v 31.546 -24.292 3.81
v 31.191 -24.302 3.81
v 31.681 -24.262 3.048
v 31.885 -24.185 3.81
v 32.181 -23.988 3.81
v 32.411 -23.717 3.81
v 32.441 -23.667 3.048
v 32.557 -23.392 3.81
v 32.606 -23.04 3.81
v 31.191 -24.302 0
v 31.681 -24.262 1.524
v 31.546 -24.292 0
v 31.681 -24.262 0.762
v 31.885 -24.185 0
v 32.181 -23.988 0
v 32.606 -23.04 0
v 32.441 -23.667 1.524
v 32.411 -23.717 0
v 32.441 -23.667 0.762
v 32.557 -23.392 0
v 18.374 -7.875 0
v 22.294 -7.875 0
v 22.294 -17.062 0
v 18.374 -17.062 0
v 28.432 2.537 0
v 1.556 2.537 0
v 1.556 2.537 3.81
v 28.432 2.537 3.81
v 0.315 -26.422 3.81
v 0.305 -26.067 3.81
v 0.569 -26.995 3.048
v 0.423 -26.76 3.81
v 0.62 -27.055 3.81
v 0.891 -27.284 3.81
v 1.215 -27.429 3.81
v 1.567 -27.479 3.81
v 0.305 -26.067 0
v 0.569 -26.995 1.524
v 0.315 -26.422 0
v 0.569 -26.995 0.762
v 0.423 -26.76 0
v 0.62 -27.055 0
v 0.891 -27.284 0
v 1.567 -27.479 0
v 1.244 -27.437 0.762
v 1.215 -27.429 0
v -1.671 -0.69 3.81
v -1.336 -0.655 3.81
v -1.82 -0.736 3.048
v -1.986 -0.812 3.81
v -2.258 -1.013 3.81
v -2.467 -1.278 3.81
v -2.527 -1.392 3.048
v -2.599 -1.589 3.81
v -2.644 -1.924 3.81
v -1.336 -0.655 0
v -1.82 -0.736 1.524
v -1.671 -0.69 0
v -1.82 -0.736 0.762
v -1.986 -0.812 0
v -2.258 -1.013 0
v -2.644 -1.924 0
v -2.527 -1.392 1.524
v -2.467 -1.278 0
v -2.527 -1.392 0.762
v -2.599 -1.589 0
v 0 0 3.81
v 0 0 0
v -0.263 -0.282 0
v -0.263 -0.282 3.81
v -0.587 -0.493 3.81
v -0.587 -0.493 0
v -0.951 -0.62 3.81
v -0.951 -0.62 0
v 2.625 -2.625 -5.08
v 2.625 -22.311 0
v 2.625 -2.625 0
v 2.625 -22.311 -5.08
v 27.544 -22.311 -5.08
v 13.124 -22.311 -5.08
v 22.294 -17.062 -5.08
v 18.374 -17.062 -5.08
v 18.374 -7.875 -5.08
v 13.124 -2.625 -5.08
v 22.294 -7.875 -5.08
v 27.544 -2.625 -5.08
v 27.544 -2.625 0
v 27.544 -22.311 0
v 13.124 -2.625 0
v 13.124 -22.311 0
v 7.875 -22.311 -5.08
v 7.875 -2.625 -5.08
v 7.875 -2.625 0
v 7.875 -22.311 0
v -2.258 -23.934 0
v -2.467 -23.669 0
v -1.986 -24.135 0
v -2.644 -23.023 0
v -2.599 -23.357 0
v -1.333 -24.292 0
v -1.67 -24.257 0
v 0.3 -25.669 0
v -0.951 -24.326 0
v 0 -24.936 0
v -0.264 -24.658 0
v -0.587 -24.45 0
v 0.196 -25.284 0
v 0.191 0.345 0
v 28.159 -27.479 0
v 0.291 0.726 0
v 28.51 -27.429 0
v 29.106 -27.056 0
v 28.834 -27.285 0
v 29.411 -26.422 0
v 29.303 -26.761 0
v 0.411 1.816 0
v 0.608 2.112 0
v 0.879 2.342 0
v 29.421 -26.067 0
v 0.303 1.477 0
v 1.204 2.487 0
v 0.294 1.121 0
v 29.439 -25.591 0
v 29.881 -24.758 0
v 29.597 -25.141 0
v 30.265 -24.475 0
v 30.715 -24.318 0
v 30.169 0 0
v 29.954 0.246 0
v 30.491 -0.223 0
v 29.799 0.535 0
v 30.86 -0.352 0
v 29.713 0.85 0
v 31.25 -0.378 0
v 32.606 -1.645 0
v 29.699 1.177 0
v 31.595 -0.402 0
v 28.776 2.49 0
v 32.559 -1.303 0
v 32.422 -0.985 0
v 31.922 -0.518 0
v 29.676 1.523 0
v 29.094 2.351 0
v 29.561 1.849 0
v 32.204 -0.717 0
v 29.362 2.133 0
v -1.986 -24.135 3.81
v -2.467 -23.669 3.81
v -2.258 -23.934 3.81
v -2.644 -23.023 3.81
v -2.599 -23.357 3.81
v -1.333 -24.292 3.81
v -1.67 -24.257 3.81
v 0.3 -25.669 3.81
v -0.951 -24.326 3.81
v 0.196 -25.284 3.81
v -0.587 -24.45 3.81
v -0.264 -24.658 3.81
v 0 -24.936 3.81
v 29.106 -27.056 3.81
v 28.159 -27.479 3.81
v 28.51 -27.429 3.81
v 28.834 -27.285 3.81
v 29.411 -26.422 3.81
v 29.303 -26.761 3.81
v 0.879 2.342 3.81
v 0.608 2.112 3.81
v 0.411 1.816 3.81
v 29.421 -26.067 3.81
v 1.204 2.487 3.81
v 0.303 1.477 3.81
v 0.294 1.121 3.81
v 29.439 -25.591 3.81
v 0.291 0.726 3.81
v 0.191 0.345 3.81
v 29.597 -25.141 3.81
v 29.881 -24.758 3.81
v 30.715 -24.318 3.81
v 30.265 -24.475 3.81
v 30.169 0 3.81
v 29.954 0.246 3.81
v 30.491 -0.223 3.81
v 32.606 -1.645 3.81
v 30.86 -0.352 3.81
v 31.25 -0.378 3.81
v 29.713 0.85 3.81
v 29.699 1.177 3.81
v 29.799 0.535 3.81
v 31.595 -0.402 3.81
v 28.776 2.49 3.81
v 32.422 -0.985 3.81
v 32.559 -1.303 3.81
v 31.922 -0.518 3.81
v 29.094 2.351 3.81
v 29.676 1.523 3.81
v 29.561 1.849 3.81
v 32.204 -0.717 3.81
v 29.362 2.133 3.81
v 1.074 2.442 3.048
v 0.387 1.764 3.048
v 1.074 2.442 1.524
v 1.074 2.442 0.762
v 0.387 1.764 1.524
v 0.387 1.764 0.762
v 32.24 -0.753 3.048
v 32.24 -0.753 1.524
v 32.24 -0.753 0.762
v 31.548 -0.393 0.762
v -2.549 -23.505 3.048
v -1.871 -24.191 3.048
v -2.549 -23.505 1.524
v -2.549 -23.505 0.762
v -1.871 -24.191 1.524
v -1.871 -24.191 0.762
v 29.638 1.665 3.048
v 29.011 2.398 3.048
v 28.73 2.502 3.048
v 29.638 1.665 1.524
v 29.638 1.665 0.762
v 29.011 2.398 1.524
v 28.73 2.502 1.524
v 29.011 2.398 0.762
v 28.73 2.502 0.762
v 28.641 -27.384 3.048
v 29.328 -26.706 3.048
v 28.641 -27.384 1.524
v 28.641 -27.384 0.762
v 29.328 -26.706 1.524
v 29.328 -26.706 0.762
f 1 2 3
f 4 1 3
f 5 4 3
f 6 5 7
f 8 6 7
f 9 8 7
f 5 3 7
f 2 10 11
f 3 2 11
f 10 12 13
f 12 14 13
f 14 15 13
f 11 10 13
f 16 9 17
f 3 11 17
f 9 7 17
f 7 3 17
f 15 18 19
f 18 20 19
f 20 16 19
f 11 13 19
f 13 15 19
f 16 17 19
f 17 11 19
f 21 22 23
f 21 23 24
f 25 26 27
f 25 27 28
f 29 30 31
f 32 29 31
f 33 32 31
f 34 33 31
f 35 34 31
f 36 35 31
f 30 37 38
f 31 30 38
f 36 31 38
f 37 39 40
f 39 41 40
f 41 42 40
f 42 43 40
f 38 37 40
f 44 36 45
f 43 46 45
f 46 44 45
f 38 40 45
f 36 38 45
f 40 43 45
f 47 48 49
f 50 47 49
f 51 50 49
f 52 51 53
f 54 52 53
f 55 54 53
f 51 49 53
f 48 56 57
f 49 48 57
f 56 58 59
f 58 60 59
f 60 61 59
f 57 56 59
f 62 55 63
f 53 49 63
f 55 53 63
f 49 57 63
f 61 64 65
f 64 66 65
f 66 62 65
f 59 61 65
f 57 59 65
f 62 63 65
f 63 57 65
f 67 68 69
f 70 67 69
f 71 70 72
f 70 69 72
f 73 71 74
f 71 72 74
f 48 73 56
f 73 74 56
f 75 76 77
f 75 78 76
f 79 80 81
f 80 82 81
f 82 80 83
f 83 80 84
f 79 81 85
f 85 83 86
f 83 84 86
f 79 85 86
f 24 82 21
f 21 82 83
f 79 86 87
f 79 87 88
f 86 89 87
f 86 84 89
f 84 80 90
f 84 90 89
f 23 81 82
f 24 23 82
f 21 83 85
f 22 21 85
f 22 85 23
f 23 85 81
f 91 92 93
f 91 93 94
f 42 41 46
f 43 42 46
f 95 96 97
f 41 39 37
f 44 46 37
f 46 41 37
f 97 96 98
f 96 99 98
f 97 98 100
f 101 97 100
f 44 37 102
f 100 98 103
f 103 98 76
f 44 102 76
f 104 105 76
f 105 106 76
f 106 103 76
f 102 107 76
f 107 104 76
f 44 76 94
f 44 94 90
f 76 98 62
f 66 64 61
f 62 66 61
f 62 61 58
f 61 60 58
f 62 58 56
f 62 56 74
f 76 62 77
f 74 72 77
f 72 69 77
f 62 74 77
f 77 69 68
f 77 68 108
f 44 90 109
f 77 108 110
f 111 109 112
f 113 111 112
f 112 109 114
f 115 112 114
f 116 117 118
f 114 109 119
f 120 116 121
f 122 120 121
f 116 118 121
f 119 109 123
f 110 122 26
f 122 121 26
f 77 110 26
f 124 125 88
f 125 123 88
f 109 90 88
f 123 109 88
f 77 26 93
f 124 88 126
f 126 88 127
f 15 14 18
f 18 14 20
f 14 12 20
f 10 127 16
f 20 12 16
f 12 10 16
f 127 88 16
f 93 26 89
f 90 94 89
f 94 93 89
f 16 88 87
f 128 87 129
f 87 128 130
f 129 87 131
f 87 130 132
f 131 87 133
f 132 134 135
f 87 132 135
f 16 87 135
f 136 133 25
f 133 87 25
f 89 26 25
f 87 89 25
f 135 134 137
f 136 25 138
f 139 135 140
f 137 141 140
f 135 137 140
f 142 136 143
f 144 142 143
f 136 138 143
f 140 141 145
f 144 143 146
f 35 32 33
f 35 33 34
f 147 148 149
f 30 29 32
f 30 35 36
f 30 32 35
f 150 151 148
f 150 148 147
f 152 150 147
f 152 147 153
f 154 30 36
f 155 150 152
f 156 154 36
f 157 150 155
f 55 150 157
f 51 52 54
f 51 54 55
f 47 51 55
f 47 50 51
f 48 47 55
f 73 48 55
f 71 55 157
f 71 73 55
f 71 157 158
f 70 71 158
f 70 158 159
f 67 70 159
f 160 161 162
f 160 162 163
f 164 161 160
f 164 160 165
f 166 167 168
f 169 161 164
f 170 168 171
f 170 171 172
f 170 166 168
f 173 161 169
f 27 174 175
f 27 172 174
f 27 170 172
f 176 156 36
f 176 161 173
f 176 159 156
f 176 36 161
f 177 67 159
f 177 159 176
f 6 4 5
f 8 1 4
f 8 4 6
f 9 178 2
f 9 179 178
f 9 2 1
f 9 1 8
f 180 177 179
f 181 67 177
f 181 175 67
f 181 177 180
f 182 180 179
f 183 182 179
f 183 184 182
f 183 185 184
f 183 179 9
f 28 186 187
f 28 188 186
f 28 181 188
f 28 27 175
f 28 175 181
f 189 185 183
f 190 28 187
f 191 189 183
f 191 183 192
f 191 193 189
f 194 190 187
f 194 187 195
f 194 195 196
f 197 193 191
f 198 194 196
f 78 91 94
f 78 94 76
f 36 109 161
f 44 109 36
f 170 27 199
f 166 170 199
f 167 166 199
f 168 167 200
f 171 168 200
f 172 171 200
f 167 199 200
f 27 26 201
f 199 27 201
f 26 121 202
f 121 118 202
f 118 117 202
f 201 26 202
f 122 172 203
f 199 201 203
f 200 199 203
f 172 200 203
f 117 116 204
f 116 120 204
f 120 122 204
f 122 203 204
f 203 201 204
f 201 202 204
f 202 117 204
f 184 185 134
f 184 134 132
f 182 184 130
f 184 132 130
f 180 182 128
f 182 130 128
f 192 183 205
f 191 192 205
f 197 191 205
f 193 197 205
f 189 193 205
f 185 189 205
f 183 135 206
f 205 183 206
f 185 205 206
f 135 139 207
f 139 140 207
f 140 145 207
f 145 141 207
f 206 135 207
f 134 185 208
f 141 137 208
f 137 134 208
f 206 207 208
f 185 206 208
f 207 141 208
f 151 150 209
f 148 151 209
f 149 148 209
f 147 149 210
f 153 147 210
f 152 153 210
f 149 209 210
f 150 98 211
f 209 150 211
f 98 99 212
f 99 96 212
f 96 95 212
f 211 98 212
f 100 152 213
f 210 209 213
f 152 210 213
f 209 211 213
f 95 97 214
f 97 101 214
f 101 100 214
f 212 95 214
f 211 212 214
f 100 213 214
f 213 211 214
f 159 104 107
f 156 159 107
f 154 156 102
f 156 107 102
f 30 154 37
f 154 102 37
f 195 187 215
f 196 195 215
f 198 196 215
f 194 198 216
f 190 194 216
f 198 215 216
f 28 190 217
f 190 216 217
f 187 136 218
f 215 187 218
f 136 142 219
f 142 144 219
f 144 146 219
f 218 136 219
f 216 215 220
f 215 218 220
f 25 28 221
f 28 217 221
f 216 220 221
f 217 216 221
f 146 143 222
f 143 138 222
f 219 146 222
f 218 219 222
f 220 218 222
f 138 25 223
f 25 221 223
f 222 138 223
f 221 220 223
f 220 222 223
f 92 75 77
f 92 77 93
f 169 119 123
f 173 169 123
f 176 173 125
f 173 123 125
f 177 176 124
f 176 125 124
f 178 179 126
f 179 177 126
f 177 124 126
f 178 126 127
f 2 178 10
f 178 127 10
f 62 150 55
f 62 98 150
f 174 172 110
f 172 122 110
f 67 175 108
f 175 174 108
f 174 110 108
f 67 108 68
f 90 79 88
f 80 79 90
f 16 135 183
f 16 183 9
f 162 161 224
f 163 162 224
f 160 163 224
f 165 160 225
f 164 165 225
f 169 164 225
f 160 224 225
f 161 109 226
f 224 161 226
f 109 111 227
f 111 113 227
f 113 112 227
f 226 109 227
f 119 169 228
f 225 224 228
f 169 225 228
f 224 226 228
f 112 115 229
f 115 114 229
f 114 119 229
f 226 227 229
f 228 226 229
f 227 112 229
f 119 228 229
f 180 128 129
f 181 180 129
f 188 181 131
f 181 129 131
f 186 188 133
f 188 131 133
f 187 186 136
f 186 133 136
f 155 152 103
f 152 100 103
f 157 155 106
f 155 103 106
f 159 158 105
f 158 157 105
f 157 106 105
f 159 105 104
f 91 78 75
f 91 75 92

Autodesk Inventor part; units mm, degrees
ref_plane "YZ Plane" through (0, 0, 0) normal (1, 0, 0) x (0, 1, 0)
ref_plane "XZ Plane" through (0, 0, 0) normal (0, 1, 0) x (-1, 0, 0)
ref_plane "XY Plane" through (0, 0, 0) normal (0, 0, 1) x (1, 0, 0)
sketch "Base" plane through (0, 0, 0) normal (0, 0, 1) x (1, 0, 0)
  spline S0 degree 3 poles (29.6992, 1.1773) (29.7109, 1.3423) (29.6903, 1.508) (29.5867, 1.8221) (29.5048, 1.9675) (29.2897, 2.2188) (29.1586, 2.3222) (28.9221, 2.4433) (28.8277, 2.4783) (28.6327, 2.5254) (28.5327, 2.5373) (28.4324, 2.5373) knots 0 0 0 0 0.049612 0.049612 0.099224 0.099224 0.148836 0.148836 0.178932 0.178932 0.209028 0.209028 0.209028 0.209028
  line L0 (1.5557, 2.5369) -> (28.4324, 2.5373)
  spline S1 degree 3 poles (1.5557, 2.5369) (1.3904, 2.5369) (1.2266, 2.5046) (0.9206, 2.379) (0.7813, 2.287) (0.5459, 2.0546) (0.452, 1.9166) (0.3443, 1.6634) (0.3145, 1.5572) (0.2831, 1.3399) (0.2816, 1.2297) (0.2942, 1.1206) knots 0 0 0 0 0.049612 0.049612 0.099224 0.099224 0.148836 0.148836 0.181775 0.181775 0.214715 0.214715 0.214715 0.214715
  arc A0 (0, 0) -> (0.2942, 1.1206) centre (-1.2879, 0.9371) ccw
  line L1 (30.1691, 0) -> (0, 0)
  arc A1 (29.6992, 1.1773) -> (30.1691, 0) centre (31.151, 1.0743) ccw
  spline S2 degree 3 poles (-2.6437, -23.0226) (-2.6437, -23.1879) (-2.6114, -23.3517) (-2.4858, -23.6576) (-2.3938, -23.7968) (-2.1615, -24.0323) (-2.0234, -24.1261) (-1.7866, -24.227) (-1.6982, -24.2538) (-1.5172, -24.2877) (-1.4252, -24.2948) (-1.3332, -24.2919) knots 0 0 0 0 0.049602 0.049602 0.099207 0.099207 0.148822 0.148822 0.176438 0.176438 0.204053 0.204053 0.204053 0.204053
  arc A2 (0, -24.9362) -> (-1.3332, -24.2919) centre (-1.2826, -25.8888) ccw
  line L2 (0, 0) -> (0, -24.9362)
  arc A3 (-1.3355, -0.6549) -> (0, 0) centre (-1.2879, 0.9371) ccw
  spline S3 degree 3 poles (-1.3355, -0.6549) (-1.5008, -0.65) (-1.6656, -0.6774) (-1.9753, -0.7938) (-2.1173, -0.8817) (-2.3596, -1.107) (-2.4576, -1.2422) (-2.5652, -1.4755) (-2.5945, -1.5626) (-2.6338, -1.7415) (-2.6437, -1.8328) (-2.6437, -1.9244) knots 0 0 0 0 0.049634 0.049634 0.099263 0.099263 0.148881 0.148881 0.176354 0.176354 0.203827 0.203827 0.203827 0.203827
  line L3 (-2.6437, -23.0226) -> (-2.6437, -1.9244)
  spline S4 degree 3 poles (28.1591, -27.4789) (28.3245, -27.4789) (28.4883, -27.4466) (28.7943, -27.3211) (28.9335, -27.229) (29.1689, -26.9966) (29.2628, -26.8586) (29.3703, -26.6061) (29.3999, -26.5007) (29.4315, -26.285) (29.4334, -26.1755) (29.4212, -26.0671) knots 0 0 0 0 0.049612 0.049612 0.099224 0.099224 0.148836 0.148836 0.181546 0.181546 0.214256 0.214256 0.214256 0.214256
  arc A4 (31.1912, -24.3016) -> (29.4212, -26.0671) centre (31.0088, -25.8888) ccw
  spline S5 degree 3 poles (31.1912, -24.3016) (31.3556, -24.3204) (31.5221, -24.307) (31.8405, -24.2172) (31.9894, -24.1416) (32.2499, -23.9376) (32.3589, -23.8111) (32.4948, -23.5721) (32.5363, -23.4703) (32.5923, -23.2585) (32.6065, -23.1495) (32.6065, -23.0399) knots 0 0 0 0 0.049634 0.049634 0.099263 0.099263 0.148881 0.148881 0.18174 0.18174 0.214599 0.214599 0.214599 0.214599
  line L4 (32.6065, -1.6448) -> (32.6065, -23.0399)
  spline S6 degree 3 poles (32.6065, -1.6448) (32.6065, -1.4795) (32.5742, -1.3157) (32.4486, -1.0098) (32.3566, -0.8705) (32.1243, -0.6351) (31.9862, -0.5412) (31.7423, -0.4373) (31.6462, -0.4092) (31.4495, -0.376) (31.3495, -0.371) (31.2499, -0.3778) knots 0 0 0 0 0.049602 0.049602 0.099206 0.099206 0.14882 0.14882 0.178752 0.178752 0.208681 0.208681 0.208681 0.208681
  arc A5 (30.1691, 0) -> (31.2499, -0.3778) centre (31.151, 1.0743) ccw
  line L5 (30.1691, -22.3113) -> (30.1691, 0)
  line L6 (27.5442, -22.3113) -> (30.1691, -22.3113)
  line L7 (27.5442, -24.9362) -> (27.5442, -22.3113)
  line L8 (0, -24.9362) -> (27.5442, -24.9362)
  arc A6 (0.305, -26.0673) -> (0, -24.9362) centre (-1.2826, -25.8888) ccw
  spline S7 degree 3 poles (0.305, -26.0673) (0.2866, -26.2317) (0.3003, -26.398) (0.3909, -26.7161) (0.4669, -26.8648) (0.6714, -27.1247) (0.7981, -27.2334) (1.037, -27.3685) (1.1385, -27.4097) (1.3494, -27.4652) (1.458, -27.4793) (1.5671, -27.4793) knots 0 0 0 0 0.049612 0.049612 0.099224 0.099224 0.148836 0.148836 0.181555 0.181555 0.214273 0.214273 0.214273 0.214273
  line L9 (28.1591, -27.4789) -> (1.5671, -27.4793)
  point P0 (30.1691, 0)
  point P1 (30.1691, 0)
extrude "BaseFeature" add sketch "Base" along normal blind 3.81
extrude "LogoFeature" add sketch "Base" against normal blind 5.08 contours L5 L6 L7 L8 L2 L1
sketch "LogoDetail" plane through (0, 0, -5.08) normal (0, 0, -1) x (-1, 0, 0)
  line L0 (-18.374, -7.8746) -> (-22.2945, -7.8746)
  line L1 (-27.5442, -22.3113) -> (-13.1243, -22.3113)
  line L2 (-22.2945, -17.0616) -> (-18.374, -17.0616)
  line L3 (-13.1243, -2.6249) -> (-27.5442, -2.6249)
  line L4 (-22.2945, -7.8746) -> (-22.2945, -17.0616)
  line L5 (-18.374, -17.0616) -> (-18.374, -7.8746)
  line L6 (-30.1691, -22.3113) -> (-30.1691, 0)
  line L7 (-27.5442, -2.6249) -> (-27.5442, -22.3113)
  line L8 (-13.1243, -22.3113) -> (-13.1243, -2.6249)
  line L9 (-30.1691, 0) -> (0, 0)
  line L10 (0, -24.9362) -> (-27.5442, -24.9362)
  line L11 (-7.8746, -2.6249) -> (-7.8746, -22.3113)
  line L12 (-2.6249, -22.3113) -> (-2.6249, -2.6249)
  line L13 (-7.8746, -22.3113) -> (-2.6249, -22.3113)
  line L14 (-2.6249, -2.6249) -> (-7.8746, -2.6249)
  line L15 (-27.5442, -24.9362) -> (-27.5442, -22.3113)
  line L16 (-27.5442, -22.3113) -> (-30.1691, -22.3113)
  line L17 (0, 0) -> (0, -24.9362)
  line L18 (-30.1691, -22.3113) -> (-30.1691, -24.9362)
  line L19 (-30.1691, -24.9362) -> (-27.5442, -24.9362)
  line L20 (0, 0) -> (-30.1691, 0) projected
  line L21 (-30.1691, 0) -> (-30.1691, -22.3113) projected
  dimension "d4" = 3.9205
  dimension "d5" = 5.2497
  dimension "d6" = 5.2497
  dimension "d7" = 5.2497
  dimension "d8" = 2.6249
  dimension "d9" = 5.2497
  dimension "d10" = 5.2497
  dimension "d11" = 2.6249
  dimension "d12" = 2.6249
  dimension "d13" = 2.6249
  dimension "d14" = 24.9362
  dimension "d15" = 27.5443
  dimension "d16" = 5.2497
extrude "LogoDetailFeature" cut sketch "LogoDetail" against normal blind 5.08 contours L5 L2 L4 L0 | L16 L6 L9 L17 L10 L15
properties part number "switchback-logo"
